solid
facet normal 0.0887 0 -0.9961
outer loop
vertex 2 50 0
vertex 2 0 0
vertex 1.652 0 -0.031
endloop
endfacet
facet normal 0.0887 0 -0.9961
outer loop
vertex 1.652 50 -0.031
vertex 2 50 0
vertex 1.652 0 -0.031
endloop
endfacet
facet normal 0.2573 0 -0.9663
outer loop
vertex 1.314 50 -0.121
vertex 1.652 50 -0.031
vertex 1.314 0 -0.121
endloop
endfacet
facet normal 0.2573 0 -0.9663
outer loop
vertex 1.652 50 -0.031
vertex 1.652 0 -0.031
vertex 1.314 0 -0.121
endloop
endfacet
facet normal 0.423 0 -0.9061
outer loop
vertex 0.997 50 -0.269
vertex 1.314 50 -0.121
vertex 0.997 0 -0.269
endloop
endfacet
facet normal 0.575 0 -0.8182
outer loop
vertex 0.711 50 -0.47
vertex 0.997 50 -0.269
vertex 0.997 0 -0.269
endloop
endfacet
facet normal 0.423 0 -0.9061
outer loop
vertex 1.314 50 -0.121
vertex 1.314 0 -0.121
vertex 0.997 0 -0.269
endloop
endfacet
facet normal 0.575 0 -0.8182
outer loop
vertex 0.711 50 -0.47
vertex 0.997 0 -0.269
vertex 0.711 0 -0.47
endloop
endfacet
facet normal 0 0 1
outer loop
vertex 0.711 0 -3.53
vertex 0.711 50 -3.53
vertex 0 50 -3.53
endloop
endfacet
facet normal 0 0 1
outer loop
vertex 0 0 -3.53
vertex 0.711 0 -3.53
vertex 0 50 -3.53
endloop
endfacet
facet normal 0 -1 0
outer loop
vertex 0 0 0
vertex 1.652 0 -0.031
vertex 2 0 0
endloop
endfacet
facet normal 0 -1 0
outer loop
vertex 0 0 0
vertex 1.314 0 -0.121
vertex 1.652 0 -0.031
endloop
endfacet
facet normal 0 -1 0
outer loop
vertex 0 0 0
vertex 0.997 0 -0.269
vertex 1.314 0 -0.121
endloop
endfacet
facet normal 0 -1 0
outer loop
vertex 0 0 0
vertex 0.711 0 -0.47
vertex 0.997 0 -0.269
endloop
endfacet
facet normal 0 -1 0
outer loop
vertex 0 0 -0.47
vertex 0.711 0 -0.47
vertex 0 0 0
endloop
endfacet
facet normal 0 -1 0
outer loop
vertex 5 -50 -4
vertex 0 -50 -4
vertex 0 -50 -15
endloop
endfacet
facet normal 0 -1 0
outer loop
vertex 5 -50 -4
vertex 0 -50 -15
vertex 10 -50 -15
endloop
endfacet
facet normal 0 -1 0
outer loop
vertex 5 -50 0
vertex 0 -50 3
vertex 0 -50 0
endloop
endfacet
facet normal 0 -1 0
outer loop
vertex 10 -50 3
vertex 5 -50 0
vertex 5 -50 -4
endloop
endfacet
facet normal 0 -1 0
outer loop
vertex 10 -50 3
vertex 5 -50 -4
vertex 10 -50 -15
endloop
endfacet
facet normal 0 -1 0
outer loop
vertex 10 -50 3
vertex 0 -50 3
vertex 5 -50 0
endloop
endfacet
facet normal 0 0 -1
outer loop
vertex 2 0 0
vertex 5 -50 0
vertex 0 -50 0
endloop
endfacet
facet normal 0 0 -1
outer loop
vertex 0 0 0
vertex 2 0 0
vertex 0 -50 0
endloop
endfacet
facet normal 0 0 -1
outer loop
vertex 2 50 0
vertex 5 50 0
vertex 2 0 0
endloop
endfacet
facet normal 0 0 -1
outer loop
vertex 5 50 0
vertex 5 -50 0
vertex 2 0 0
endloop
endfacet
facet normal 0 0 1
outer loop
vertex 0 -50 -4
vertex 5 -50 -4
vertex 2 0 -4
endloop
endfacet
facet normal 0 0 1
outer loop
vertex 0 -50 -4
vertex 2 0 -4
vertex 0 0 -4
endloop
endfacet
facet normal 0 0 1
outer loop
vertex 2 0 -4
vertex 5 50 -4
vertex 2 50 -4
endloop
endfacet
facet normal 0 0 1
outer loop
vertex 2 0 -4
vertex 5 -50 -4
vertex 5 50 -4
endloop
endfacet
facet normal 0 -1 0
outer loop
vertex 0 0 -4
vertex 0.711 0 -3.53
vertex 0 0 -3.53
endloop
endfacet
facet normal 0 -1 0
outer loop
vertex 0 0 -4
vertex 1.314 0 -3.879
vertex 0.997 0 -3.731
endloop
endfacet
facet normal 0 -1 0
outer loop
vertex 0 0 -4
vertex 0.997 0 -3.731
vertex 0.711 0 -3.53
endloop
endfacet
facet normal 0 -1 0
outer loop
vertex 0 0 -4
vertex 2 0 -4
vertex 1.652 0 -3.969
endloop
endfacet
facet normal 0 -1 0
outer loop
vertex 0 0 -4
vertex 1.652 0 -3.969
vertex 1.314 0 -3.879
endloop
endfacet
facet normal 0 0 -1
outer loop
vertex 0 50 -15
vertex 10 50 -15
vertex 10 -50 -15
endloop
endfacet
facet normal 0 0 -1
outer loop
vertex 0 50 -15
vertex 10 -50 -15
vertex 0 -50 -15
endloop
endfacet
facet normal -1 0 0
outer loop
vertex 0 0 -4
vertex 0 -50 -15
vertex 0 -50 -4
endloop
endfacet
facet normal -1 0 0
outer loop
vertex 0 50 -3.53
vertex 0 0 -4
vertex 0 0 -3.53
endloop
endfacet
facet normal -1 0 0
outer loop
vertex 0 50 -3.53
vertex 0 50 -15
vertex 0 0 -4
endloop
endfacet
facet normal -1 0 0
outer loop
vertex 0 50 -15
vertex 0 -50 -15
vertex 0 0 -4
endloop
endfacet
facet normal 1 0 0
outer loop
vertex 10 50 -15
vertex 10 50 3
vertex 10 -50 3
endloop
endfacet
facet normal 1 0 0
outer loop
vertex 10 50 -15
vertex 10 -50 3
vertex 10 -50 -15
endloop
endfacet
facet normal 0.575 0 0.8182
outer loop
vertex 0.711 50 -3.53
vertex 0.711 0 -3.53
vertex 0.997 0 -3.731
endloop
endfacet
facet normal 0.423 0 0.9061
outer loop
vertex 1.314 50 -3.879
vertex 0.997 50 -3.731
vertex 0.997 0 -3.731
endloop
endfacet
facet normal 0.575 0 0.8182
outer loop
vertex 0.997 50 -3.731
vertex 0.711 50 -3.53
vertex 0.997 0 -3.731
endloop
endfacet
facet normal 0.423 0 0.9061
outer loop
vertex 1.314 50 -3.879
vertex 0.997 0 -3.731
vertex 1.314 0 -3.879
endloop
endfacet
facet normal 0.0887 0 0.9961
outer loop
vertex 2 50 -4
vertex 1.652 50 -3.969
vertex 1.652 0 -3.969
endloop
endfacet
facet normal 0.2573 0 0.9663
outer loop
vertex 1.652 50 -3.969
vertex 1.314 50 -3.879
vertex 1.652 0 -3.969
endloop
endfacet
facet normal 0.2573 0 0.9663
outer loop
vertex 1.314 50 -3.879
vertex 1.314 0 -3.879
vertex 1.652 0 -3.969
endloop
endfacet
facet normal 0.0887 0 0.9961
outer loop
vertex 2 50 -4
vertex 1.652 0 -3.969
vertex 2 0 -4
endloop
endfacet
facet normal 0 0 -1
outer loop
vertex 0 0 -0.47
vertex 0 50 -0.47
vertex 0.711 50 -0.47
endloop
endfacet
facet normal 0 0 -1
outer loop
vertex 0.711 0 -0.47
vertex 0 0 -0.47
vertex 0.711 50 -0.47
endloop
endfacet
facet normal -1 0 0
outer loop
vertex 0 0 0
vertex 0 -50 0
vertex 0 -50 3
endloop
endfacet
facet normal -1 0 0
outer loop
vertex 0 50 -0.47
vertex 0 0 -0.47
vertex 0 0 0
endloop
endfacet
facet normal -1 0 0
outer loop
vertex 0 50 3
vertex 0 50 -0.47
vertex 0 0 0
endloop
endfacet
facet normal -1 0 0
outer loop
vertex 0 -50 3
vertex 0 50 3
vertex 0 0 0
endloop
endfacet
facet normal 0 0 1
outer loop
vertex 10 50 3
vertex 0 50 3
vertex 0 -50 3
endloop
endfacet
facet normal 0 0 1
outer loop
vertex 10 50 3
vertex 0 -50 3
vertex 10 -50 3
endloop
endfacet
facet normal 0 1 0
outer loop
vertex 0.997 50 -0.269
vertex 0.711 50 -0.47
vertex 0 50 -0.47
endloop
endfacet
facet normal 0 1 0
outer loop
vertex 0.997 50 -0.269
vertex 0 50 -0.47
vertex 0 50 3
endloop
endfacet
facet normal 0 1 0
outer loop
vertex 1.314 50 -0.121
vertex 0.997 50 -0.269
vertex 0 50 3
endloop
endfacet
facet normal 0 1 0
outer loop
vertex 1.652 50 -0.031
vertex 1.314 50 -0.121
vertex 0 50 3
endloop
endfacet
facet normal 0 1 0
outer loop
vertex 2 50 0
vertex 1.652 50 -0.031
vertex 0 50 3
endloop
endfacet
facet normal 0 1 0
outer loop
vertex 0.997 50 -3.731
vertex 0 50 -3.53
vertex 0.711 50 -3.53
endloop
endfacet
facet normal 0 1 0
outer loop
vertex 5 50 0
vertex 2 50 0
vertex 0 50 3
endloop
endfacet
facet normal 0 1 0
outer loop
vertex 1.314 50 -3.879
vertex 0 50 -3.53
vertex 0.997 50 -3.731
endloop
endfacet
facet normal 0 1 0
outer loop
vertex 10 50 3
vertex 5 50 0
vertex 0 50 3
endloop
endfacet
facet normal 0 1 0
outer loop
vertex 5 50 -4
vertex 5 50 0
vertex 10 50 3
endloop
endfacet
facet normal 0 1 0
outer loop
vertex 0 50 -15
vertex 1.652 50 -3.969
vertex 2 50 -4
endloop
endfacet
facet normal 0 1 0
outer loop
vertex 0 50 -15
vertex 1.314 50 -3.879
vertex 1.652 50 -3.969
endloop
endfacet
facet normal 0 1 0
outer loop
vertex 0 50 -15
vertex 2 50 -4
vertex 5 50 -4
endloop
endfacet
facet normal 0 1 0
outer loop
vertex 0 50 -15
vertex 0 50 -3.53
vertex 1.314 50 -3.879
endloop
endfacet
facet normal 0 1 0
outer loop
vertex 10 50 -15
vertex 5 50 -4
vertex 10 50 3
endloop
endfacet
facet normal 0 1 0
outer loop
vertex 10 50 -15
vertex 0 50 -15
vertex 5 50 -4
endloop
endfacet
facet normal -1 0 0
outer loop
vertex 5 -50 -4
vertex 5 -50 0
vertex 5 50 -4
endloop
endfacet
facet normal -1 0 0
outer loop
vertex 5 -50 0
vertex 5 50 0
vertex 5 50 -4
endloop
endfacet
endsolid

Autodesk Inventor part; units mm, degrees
ref_plane "YZ Plane" through (0, 0, 0) normal (1, 0, 0) x (0, 1, 0)
ref_plane "XZ Plane" through (0, 0, 0) normal (0, 1, 0) x (-1, 0, 0)
ref_plane "XY Plane" through (0, 0, 0) normal (0, 0, 1) x (1, 0, 0)
sketch "Sketch1" plane through (0, 0, 0) normal (0, 1, 0) x (-1, 0, 0)
  point P0 (0, 0)
sketch "Sketch2" plane through (0, 0, 0) normal (0, 1, 0) x (-1, 0, 0)
  line L0 (0, 0) -> (-5, 0)
  line L1 (-5, 0) -> (-5, -4)
  line L2 (-5, -4) -> (0, -4)
  line L3 (0, -4) -> (0, 0)
  line L4 (0, 0) -> (-10, 0)
  line L5 (-10, 0) -> (-10, -15)
  line L6 (-10, -15) -> (0, -15)
  line L7 (0, -15) -> (0, 0)
  circle A0 centre (-2, -2) radius 2
  point P0 (-2, 0)
  point P1 (0, -2)
  point P2 (-2, -4)
  dimension "d0" = 5
  dimension "d1" = 4
  dimension "d2" = 10
  dimension "d3" = 15
sketch "Sketch3" plane through (0, 0, 0) normal (0, 1, 0) x (-1, 0, 0)
  line L0 (0, 0) -> (0, -4.0004)
  line L1 (0, -4.0004) -> (0, -2.0004)
  line L2 (0, -4.0004) -> (-2.5, -4.0004)
  dimension "d4" = 2
  dimension "d5" = 2.5
extrude "Extrusion1" add sketch "Sketch2" along normal blind 50 contours L3 A0 L0 | L3 L2 A0 | L1 L2 L7 L6 L5 L4
sketch "Sketch4" plane through (5, 0, 0) normal (0, 0, 1) x (1, 0, 0)
  line L0 (-5, 0) -> (-5, 50) projected
  line L1 (-5, 50) -> (5, 50)
  line L2 (5, 50) -> (5, 0)
  line L3 (5, 0) -> (-5, 0)
  line L4 (-5, 0) -> (-5, 50)
extrude "Extrusion2" add sketch "Sketch4" along normal blind 3
sketch "Sketch5" plane through (0, 0, 0) normal (0, -1, 0) x (1, 0, 0)
  arc A0 (2, 0) -> (0, -2) centre (2, -2) ccw projected
  line L0 (0, -3.5296) -> (0, -0.4704)
  line L1 (0, -0.4704) -> (1.4533, -0.4704)
  line L2 (1.4533, -0.4704) -> (1.4533, -3.5296)
  line L3 (1.4533, -3.5296) -> (0, -3.5296)
  line L4 (0, -3.5296) -> (0, -0.4704)
  point P0 (0, 0)
  point P1 (0.7115, -0.4704)
extrude "Extrusion3" cut sketch "Sketch5" against normal blind 200 contours L1 L2 L3 L0 A0
sketch "Sketch6" plane through (0, 0, 0) normal (0, -1, 0) x (1, 0, 0)
  line L0 (0, -2) -> (0, 3) projected
  line L1 (0, -0.4704) -> (1.2121, -0.4704)
  line L2 (1.2121, -0.4704) -> (1.2121, -2.1829)
  line L3 (1.2121, -2.1829) -> (0, -2.1829)
  line L4 (0, -2.1829) -> (0, -0.4704)
  point P0 (0, 0)
extrude "Extrusion4" cut sketch "Sketch6" against normal blind 200
sketch "Sketch7" plane through (0, 50, 0) normal (0, 1, 0) x (1, 0, 0)
  point P0 (0, 0)
extrude "Extrusion5" add sketch "Sketch2" against normal blind 50 contours L1 L2 L7 L6 L5 L4
sketch "Sketch8" plane through (0, 0, 0) normal (0, -1, 0) x (1, 0, 0)
  line L0 (5, 0) -> (10, 0) projected
  line L1 (0, -0.4704) -> (0, 3) projected
  line L2 (10, 0) -> (0, 0)
  line L3 (0, 0) -> (0, 3)
  line L4 (0, 3) -> (10, 3)
  line L5 (10, 3) -> (10, 0)
extrude "Extrusion6" add sketch "Sketch8" along normal blind 50
sketch "Sketch9" plane through (0, 0, 0) normal (0, -1, 0) x (1, 0, 0)
  point P0 (0, 0)
properties part number "basebody"
